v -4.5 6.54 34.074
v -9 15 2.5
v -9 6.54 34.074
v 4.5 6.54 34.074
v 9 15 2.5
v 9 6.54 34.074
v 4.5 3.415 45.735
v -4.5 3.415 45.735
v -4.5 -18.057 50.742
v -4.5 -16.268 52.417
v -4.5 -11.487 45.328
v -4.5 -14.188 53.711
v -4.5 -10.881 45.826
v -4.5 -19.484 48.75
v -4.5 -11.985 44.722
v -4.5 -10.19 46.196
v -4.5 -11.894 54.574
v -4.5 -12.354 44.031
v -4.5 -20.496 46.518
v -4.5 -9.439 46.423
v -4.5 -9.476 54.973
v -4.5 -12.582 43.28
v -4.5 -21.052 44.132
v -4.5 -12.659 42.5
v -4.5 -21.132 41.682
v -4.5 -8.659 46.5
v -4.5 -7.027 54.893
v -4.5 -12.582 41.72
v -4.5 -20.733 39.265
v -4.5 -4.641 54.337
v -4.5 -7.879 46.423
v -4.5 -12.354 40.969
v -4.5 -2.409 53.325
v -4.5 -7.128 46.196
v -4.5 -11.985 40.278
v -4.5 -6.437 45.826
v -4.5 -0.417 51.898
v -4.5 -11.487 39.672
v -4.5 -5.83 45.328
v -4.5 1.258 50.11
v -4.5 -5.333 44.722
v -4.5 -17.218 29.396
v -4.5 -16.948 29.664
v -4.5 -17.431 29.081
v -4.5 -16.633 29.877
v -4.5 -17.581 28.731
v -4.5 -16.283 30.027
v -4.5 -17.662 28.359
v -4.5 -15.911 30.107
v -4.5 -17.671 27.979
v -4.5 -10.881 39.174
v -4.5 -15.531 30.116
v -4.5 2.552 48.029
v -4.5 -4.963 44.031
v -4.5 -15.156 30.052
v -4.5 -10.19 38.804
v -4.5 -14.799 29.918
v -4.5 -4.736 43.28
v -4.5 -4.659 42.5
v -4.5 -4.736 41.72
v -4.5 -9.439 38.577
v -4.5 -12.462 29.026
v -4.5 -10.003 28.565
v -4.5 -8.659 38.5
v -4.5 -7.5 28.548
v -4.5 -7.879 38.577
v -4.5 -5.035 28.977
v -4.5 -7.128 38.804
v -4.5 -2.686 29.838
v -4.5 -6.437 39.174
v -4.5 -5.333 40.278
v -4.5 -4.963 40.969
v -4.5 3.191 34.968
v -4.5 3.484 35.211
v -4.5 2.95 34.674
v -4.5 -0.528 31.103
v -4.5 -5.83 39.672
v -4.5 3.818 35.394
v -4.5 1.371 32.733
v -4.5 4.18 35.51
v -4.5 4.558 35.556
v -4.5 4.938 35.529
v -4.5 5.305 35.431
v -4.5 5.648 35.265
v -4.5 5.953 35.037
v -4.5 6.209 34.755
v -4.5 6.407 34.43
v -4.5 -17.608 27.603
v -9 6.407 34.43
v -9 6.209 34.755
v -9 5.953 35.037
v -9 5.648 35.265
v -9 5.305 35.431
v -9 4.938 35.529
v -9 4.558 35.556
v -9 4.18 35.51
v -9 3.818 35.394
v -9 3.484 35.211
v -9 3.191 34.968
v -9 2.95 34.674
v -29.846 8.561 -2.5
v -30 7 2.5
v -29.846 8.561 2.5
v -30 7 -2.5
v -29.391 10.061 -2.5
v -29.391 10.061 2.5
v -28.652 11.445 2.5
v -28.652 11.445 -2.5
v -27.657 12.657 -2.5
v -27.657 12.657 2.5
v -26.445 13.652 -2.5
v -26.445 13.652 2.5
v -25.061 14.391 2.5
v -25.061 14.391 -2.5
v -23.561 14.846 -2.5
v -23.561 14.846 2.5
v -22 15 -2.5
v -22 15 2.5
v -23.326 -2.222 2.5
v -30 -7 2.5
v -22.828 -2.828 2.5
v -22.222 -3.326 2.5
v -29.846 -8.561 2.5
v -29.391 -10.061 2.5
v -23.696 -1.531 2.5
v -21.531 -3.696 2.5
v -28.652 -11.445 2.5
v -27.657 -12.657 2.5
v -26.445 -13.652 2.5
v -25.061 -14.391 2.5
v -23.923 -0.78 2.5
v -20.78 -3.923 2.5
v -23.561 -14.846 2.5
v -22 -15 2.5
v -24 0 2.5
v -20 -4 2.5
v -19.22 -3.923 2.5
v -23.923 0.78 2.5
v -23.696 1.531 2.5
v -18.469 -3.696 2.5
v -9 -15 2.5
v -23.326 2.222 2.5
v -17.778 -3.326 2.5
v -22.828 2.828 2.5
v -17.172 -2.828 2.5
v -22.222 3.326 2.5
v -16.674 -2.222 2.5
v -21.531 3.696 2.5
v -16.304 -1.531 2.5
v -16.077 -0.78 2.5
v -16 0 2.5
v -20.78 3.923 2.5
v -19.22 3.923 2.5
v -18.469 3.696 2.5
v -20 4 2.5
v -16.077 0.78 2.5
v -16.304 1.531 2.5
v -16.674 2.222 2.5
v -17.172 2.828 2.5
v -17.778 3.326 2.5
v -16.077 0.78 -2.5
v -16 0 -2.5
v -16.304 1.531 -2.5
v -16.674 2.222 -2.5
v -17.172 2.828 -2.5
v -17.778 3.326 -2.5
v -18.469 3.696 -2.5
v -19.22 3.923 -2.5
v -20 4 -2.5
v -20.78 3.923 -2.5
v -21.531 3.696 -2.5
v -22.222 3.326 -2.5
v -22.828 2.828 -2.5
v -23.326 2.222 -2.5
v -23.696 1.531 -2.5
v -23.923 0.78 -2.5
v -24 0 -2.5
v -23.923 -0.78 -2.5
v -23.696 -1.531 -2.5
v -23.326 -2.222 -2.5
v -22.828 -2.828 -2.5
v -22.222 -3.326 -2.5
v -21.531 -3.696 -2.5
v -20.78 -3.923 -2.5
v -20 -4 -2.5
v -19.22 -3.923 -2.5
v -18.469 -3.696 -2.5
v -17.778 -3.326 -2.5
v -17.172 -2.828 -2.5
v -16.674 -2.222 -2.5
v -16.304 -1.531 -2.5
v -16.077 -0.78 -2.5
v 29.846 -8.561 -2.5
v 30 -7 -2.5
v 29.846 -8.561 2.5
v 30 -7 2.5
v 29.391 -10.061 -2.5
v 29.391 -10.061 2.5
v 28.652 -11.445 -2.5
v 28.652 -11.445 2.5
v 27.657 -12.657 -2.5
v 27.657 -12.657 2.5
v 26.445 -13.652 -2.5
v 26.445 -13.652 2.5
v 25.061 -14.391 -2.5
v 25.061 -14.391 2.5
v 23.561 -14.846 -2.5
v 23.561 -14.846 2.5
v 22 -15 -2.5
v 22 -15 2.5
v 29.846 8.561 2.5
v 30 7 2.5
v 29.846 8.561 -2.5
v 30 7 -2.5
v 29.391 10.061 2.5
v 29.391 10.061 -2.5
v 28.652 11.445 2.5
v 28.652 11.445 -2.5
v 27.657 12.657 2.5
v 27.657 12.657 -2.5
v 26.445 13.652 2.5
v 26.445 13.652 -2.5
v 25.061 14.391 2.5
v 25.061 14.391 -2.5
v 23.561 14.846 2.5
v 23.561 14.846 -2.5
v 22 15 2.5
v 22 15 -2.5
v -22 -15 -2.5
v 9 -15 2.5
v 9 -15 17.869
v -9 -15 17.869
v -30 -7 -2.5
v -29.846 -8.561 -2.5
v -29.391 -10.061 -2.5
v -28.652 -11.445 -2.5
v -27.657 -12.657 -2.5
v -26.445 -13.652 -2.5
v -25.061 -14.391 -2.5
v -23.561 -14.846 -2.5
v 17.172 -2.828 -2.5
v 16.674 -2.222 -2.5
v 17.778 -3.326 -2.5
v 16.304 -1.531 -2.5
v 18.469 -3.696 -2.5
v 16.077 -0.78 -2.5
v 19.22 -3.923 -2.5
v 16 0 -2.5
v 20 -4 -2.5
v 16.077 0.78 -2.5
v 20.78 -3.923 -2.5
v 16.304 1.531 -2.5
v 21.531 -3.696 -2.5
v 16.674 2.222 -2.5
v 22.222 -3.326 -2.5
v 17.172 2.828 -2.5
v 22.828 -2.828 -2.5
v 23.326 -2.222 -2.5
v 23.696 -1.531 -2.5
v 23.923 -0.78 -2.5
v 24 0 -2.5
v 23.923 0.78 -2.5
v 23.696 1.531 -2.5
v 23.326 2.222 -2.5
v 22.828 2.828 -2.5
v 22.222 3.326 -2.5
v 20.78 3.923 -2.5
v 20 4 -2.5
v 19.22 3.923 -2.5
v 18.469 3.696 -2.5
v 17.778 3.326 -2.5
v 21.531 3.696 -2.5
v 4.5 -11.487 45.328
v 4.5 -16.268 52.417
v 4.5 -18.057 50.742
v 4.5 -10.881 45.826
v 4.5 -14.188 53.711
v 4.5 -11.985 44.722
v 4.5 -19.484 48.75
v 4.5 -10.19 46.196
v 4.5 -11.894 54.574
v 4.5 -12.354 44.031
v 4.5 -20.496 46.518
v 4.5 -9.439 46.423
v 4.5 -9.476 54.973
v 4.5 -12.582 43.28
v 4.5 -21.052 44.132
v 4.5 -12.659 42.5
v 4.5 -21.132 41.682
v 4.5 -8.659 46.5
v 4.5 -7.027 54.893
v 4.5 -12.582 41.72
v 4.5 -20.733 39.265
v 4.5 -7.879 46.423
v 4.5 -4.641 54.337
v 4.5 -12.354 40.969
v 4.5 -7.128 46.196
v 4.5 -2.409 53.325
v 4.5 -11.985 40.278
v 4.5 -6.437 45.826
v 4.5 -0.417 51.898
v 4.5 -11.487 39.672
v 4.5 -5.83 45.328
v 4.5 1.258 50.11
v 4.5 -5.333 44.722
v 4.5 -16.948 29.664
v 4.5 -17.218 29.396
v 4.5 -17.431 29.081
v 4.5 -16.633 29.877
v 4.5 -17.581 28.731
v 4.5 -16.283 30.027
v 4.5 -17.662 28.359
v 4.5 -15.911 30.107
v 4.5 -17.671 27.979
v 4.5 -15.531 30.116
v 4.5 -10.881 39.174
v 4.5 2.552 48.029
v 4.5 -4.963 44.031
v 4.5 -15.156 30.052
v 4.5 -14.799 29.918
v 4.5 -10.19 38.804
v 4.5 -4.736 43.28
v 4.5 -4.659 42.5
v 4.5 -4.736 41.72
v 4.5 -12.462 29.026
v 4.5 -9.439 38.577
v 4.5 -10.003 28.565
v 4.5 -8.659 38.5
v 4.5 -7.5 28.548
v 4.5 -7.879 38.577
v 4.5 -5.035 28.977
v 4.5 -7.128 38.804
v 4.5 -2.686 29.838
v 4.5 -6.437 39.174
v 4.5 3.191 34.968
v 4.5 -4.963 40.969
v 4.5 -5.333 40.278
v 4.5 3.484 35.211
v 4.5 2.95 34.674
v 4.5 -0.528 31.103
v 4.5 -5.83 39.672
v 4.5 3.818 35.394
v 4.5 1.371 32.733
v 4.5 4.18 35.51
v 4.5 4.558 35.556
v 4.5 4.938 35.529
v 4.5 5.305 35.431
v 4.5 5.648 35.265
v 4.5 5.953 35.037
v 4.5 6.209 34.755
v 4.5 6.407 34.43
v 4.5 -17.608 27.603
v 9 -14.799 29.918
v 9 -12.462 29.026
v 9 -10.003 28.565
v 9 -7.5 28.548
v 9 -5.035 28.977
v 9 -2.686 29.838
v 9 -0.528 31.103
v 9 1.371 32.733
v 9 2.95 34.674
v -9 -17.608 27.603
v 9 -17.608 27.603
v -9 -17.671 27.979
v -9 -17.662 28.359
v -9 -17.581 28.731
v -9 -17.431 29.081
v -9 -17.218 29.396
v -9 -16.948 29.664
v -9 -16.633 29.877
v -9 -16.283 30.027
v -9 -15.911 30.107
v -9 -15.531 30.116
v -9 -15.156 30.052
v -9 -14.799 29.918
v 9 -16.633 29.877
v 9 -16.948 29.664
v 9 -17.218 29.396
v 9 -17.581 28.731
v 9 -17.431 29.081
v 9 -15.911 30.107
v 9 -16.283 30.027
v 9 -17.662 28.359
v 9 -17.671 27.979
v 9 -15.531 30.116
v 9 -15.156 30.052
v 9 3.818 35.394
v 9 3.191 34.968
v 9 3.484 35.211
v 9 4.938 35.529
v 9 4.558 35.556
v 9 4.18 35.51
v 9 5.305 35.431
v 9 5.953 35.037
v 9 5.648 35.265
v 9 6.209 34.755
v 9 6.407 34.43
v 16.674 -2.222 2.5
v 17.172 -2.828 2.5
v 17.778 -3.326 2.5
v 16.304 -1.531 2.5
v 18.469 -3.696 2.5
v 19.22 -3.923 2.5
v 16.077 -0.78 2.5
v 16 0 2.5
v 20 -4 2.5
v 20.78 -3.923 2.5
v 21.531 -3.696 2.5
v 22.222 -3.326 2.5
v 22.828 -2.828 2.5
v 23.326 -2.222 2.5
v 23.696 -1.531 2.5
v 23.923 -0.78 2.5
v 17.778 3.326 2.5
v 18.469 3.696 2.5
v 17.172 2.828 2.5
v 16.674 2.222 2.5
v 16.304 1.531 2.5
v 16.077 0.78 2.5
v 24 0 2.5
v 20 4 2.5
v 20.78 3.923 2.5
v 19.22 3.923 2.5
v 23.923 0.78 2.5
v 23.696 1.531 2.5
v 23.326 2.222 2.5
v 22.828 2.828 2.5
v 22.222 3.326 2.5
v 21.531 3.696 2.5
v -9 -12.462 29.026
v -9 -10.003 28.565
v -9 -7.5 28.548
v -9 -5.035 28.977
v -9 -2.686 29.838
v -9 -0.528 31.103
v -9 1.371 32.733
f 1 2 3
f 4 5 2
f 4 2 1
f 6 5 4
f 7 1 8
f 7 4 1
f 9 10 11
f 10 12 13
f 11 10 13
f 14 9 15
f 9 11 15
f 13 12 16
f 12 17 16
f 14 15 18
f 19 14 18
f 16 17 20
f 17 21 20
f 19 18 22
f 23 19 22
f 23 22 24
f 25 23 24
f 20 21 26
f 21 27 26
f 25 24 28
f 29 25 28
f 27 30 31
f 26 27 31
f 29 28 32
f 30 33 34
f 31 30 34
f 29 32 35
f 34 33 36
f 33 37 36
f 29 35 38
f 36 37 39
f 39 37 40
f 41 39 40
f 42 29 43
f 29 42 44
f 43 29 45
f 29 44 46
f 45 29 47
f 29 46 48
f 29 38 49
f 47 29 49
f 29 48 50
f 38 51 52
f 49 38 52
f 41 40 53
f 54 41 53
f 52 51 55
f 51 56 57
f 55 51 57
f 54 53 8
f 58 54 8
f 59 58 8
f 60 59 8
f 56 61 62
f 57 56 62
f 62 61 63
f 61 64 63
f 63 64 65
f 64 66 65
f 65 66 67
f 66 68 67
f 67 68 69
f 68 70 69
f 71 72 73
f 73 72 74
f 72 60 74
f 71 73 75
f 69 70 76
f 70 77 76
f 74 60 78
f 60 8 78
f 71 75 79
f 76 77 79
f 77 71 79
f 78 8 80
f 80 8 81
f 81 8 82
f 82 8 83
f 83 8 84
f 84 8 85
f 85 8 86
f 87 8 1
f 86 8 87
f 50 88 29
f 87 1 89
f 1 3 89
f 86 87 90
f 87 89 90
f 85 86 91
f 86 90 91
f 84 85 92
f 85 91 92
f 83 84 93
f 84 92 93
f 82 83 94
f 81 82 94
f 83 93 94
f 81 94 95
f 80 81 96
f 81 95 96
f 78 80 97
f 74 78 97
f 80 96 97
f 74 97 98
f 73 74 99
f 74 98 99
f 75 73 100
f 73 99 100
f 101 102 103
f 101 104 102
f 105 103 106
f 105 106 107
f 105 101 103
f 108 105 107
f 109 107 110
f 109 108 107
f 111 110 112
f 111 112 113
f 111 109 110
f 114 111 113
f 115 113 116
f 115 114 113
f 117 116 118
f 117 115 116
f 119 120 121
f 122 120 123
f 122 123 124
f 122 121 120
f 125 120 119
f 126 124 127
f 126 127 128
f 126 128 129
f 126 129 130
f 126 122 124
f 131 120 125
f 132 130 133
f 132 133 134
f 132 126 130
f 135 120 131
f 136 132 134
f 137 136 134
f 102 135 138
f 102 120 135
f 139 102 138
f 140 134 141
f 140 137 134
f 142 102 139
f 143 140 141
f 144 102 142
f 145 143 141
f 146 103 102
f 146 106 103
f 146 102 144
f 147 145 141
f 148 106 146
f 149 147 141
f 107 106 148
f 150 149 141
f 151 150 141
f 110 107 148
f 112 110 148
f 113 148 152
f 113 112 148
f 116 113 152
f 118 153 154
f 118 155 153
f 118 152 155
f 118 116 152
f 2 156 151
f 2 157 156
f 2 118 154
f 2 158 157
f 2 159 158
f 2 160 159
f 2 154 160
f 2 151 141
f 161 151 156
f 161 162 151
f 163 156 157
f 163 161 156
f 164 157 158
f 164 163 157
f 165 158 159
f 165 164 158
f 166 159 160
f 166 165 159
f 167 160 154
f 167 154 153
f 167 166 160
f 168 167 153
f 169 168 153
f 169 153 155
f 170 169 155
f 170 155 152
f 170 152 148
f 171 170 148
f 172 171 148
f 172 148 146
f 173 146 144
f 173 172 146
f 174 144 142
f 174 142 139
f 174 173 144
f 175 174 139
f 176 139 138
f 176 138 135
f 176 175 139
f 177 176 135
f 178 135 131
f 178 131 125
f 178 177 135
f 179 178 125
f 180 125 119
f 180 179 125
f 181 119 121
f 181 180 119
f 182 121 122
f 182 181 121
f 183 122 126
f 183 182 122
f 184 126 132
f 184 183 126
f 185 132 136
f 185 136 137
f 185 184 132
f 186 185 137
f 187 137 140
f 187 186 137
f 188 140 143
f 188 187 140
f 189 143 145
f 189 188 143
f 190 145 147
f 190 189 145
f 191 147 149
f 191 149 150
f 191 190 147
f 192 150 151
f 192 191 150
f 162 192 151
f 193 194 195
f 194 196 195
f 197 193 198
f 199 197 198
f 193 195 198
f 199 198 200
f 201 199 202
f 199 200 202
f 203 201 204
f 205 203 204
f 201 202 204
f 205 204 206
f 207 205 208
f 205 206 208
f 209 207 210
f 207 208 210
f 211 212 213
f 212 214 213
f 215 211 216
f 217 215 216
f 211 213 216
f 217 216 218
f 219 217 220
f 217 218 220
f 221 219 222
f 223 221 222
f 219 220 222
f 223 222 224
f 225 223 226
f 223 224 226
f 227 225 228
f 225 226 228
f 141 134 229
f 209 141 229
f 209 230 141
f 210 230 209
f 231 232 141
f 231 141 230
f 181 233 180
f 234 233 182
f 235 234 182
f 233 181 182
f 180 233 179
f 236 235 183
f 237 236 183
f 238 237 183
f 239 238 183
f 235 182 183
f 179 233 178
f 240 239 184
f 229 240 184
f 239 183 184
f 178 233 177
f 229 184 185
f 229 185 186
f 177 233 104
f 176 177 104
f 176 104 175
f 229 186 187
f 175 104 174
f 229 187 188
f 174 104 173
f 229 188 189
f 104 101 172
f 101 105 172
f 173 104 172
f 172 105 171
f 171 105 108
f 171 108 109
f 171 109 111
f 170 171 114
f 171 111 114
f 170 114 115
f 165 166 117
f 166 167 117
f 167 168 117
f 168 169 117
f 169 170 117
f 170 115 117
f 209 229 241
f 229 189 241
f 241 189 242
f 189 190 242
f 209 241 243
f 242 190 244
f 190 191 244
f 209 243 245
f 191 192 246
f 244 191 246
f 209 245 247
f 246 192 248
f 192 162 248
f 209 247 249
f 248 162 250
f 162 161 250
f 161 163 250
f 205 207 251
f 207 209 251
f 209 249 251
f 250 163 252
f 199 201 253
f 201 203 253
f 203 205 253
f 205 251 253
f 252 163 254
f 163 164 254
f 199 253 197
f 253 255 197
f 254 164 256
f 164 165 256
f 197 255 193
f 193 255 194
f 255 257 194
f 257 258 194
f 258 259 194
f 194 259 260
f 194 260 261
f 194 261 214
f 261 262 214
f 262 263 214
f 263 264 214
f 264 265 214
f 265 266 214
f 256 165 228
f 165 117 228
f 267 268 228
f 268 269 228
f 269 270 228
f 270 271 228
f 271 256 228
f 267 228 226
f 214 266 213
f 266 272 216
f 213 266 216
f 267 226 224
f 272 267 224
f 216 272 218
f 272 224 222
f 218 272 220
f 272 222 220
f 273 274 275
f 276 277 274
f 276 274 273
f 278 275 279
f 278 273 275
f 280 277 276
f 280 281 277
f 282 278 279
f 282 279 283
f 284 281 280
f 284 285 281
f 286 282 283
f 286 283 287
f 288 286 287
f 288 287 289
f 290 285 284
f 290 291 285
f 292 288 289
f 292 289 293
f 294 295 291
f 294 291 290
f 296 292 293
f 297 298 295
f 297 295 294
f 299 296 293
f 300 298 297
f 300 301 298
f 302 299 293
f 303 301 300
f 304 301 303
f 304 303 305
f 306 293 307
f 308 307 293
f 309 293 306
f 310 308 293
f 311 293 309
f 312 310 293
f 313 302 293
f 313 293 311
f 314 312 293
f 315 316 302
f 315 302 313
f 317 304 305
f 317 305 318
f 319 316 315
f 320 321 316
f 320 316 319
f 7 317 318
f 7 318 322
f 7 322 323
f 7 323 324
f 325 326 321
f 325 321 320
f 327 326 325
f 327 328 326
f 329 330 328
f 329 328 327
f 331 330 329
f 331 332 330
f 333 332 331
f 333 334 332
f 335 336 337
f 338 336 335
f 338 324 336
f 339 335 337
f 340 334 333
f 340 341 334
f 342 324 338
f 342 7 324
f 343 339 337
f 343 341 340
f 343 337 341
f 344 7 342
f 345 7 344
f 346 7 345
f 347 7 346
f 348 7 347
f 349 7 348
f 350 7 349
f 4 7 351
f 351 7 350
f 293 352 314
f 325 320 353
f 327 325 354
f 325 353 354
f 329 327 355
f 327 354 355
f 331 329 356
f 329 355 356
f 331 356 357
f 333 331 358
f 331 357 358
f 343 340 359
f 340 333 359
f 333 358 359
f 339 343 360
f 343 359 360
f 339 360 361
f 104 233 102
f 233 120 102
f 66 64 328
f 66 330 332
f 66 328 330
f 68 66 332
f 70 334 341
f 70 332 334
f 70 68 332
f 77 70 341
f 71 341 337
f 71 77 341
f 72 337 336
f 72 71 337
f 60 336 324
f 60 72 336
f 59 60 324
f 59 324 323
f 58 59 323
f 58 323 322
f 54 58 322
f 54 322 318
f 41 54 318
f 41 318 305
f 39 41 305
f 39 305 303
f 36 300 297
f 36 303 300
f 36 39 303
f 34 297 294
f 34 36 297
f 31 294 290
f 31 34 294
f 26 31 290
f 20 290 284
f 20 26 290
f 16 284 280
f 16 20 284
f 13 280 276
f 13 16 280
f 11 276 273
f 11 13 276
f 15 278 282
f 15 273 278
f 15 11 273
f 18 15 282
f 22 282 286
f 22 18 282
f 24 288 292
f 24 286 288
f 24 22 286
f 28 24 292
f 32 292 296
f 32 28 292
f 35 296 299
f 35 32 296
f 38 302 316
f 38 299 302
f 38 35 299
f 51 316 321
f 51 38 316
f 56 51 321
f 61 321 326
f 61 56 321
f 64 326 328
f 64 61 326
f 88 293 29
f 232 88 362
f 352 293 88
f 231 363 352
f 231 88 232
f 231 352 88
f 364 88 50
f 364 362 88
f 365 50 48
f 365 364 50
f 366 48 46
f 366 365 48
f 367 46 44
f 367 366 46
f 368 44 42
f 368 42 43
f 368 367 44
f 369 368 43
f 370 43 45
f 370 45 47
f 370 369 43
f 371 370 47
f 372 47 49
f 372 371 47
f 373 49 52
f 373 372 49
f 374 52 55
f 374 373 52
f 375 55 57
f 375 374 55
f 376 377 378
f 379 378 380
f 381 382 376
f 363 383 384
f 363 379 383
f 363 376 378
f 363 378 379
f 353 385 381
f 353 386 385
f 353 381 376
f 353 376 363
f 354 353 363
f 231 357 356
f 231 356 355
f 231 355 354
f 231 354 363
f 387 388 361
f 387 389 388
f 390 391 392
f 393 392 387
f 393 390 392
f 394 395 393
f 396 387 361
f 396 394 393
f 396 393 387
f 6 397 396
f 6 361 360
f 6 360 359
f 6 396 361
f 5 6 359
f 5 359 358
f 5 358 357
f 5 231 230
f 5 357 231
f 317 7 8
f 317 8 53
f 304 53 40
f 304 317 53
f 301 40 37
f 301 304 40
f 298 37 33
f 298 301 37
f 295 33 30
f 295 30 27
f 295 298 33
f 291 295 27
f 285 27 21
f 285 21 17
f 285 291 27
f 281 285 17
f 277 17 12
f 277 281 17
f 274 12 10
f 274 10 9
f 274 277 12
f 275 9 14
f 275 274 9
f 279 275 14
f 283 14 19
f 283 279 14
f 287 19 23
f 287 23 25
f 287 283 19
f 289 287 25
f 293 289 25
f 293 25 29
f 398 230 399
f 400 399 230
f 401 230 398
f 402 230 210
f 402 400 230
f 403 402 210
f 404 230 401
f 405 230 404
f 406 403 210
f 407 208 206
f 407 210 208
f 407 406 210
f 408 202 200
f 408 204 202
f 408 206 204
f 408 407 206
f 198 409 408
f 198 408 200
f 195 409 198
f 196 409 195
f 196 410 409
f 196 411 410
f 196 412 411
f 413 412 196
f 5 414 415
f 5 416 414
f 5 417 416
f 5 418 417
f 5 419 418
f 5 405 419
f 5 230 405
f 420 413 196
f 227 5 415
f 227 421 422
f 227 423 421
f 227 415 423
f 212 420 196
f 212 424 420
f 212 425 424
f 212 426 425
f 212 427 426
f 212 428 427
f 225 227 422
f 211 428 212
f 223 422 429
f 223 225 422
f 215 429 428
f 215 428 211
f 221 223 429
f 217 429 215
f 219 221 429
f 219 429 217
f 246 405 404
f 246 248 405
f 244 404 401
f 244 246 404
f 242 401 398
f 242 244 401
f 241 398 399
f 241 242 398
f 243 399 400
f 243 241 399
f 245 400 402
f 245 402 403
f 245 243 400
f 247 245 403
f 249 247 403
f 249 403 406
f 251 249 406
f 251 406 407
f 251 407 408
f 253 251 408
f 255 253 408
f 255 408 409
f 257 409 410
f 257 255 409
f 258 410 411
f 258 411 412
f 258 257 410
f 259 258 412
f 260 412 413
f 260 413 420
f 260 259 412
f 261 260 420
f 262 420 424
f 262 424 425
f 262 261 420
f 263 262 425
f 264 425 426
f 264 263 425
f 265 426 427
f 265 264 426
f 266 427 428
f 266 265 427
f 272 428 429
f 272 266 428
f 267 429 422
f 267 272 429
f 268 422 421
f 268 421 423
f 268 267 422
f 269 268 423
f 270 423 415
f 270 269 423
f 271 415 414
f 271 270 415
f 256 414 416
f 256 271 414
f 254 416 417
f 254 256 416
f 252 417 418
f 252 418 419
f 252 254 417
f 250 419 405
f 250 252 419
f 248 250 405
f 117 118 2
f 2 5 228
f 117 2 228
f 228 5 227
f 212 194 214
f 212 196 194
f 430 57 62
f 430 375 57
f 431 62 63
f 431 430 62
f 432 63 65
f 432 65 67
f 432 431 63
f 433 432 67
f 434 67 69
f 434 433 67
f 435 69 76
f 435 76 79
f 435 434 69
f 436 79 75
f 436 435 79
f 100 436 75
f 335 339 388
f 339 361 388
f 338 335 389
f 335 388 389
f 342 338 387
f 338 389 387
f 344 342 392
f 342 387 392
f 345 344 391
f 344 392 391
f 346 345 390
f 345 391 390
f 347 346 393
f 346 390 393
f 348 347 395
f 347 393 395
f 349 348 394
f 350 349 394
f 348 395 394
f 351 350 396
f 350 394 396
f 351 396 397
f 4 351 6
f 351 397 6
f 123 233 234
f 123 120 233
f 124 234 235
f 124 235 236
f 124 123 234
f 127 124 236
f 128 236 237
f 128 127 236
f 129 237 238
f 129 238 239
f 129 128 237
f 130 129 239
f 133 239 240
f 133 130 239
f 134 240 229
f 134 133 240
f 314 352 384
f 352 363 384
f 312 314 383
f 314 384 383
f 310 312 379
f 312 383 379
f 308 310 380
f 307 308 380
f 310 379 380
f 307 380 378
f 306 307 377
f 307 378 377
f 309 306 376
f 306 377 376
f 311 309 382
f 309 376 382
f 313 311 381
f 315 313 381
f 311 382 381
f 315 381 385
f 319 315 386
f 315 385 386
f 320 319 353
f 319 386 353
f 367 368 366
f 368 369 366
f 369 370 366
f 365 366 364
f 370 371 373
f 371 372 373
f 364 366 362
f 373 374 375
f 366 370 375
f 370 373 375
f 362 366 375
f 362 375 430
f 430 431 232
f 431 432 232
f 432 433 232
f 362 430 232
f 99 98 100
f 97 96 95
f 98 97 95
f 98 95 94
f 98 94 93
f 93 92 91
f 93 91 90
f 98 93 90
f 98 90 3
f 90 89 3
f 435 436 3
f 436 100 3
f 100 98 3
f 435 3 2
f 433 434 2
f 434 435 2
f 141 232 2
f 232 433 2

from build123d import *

# Parameters (mm, degrees)
SKETCH1_W            = 60
SKETCH1_H            = 30
SKETCH1_R            = 4
BOSS_EXTRUDE1_DEPTH  = 2.5
FILLET1_R            = 8
SKETCH3_R            = 4
BOSS_EXTRUDE2_DEPTH  = 9
SKETCH4_R            = 14
CUT_EXTRUDE1_DEPTH   = 4.5
FILLET2_R            = 2
FILLET2_OF_MIRROR1_R = 2


with BuildPart() as part:
    # Sketch1 → Boss-Extrude1 (new, symmetric)
    with BuildSketch(Plane.XY):
        Rectangle(SKETCH1_W, SKETCH1_H)
        with Locations((-20, 0)):
            Circle(SKETCH1_R, mode=Mode.SUBTRACT)
        with Locations(Location((20, 0, 0), (0, 0, 180))):
            Circle(SKETCH1_R, mode=Mode.SUBTRACT)
    extrude(amount=BOSS_EXTRUDE1_DEPTH, both=True)

    # Fillet1
    fillet1_edges = [part.edges().sort_by_distance(p)[0] for p in [
        (30, -15, 0),
        (-30, -15, 0),
        (-30, 15, 0),
        (30, 15, 0),
    ]]
    fillet(fillet1_edges, radius=FILLET1_R)

    # Sketch3 → Boss-Extrude2 (add, symmetric)
    with BuildSketch(Plane(origin=(0, 0, 0), x_dir=(0, 0, -1), z_dir=(1, 0, 0))):
        with BuildLine():
            Line((-2.5, 15), (-45.735238064, 3.415152876))
            ThreePointArc((-45.735238064, 3.415152876), (-54.574072829, -11.894158016), (-39.264761936, -20.732992781))
            Line((-39.264761936, -20.732992781), (-17.868941598, -15))
            Line((-17.868941598, -15), (-2.5, -15))
            Line((-2.5, -15), (-2.5, 15))
        make_face()
        with Locations((-42.5, -8.658919952)):
            Circle(SKETCH3_R, mode=Mode.SUBTRACT)
    extrude(amount=BOSS_EXTRUDE2_DEPTH, both=True)

    # Sketch4 → Cut-Extrude1 (cut)
    with BuildSketch(Plane(origin=(9, 0, 0), x_dir=(0, 0, -1), z_dir=(1, 0, 0))):
        with Locations((-42.5, -8.658919952)):
            Circle(SKETCH4_R)
    cut_extrude1 = extrude(amount=-CUT_EXTRUDE1_DEPTH, mode=Mode.SUBTRACT)

    # Fillet2
    fillet2_edges = [part.edges().sort_by_distance(p)[0] for p in [
        (6.75, -19.101200791, 33.174831321),
        (6.75, 5.046944867, 39.645307448),
    ]]
    fillet(fillet2_edges, radius=FILLET2_R)

    # Mirror1: Cut-Extrude1 across plane
    add(cut_extrude1.mirror(Plane(origin=(0, 0, 0), x_dir=(0, 0, 1), z_dir=(1, 0, 0))), mode=Mode.SUBTRACT)

    # Fillet2 of Mirror1
    fillet2_of_mirror1_edges = [part.edges().sort_by_distance(p)[0] for p in [
        (-6.75, -19.101200791, 33.174831321),
        (-6.75, 5.046944867, 39.645307448),
    ]]
    fillet(fillet2_of_mirror1_edges, radius=FILLET2_OF_MIRROR1_R)


solid = part.part
